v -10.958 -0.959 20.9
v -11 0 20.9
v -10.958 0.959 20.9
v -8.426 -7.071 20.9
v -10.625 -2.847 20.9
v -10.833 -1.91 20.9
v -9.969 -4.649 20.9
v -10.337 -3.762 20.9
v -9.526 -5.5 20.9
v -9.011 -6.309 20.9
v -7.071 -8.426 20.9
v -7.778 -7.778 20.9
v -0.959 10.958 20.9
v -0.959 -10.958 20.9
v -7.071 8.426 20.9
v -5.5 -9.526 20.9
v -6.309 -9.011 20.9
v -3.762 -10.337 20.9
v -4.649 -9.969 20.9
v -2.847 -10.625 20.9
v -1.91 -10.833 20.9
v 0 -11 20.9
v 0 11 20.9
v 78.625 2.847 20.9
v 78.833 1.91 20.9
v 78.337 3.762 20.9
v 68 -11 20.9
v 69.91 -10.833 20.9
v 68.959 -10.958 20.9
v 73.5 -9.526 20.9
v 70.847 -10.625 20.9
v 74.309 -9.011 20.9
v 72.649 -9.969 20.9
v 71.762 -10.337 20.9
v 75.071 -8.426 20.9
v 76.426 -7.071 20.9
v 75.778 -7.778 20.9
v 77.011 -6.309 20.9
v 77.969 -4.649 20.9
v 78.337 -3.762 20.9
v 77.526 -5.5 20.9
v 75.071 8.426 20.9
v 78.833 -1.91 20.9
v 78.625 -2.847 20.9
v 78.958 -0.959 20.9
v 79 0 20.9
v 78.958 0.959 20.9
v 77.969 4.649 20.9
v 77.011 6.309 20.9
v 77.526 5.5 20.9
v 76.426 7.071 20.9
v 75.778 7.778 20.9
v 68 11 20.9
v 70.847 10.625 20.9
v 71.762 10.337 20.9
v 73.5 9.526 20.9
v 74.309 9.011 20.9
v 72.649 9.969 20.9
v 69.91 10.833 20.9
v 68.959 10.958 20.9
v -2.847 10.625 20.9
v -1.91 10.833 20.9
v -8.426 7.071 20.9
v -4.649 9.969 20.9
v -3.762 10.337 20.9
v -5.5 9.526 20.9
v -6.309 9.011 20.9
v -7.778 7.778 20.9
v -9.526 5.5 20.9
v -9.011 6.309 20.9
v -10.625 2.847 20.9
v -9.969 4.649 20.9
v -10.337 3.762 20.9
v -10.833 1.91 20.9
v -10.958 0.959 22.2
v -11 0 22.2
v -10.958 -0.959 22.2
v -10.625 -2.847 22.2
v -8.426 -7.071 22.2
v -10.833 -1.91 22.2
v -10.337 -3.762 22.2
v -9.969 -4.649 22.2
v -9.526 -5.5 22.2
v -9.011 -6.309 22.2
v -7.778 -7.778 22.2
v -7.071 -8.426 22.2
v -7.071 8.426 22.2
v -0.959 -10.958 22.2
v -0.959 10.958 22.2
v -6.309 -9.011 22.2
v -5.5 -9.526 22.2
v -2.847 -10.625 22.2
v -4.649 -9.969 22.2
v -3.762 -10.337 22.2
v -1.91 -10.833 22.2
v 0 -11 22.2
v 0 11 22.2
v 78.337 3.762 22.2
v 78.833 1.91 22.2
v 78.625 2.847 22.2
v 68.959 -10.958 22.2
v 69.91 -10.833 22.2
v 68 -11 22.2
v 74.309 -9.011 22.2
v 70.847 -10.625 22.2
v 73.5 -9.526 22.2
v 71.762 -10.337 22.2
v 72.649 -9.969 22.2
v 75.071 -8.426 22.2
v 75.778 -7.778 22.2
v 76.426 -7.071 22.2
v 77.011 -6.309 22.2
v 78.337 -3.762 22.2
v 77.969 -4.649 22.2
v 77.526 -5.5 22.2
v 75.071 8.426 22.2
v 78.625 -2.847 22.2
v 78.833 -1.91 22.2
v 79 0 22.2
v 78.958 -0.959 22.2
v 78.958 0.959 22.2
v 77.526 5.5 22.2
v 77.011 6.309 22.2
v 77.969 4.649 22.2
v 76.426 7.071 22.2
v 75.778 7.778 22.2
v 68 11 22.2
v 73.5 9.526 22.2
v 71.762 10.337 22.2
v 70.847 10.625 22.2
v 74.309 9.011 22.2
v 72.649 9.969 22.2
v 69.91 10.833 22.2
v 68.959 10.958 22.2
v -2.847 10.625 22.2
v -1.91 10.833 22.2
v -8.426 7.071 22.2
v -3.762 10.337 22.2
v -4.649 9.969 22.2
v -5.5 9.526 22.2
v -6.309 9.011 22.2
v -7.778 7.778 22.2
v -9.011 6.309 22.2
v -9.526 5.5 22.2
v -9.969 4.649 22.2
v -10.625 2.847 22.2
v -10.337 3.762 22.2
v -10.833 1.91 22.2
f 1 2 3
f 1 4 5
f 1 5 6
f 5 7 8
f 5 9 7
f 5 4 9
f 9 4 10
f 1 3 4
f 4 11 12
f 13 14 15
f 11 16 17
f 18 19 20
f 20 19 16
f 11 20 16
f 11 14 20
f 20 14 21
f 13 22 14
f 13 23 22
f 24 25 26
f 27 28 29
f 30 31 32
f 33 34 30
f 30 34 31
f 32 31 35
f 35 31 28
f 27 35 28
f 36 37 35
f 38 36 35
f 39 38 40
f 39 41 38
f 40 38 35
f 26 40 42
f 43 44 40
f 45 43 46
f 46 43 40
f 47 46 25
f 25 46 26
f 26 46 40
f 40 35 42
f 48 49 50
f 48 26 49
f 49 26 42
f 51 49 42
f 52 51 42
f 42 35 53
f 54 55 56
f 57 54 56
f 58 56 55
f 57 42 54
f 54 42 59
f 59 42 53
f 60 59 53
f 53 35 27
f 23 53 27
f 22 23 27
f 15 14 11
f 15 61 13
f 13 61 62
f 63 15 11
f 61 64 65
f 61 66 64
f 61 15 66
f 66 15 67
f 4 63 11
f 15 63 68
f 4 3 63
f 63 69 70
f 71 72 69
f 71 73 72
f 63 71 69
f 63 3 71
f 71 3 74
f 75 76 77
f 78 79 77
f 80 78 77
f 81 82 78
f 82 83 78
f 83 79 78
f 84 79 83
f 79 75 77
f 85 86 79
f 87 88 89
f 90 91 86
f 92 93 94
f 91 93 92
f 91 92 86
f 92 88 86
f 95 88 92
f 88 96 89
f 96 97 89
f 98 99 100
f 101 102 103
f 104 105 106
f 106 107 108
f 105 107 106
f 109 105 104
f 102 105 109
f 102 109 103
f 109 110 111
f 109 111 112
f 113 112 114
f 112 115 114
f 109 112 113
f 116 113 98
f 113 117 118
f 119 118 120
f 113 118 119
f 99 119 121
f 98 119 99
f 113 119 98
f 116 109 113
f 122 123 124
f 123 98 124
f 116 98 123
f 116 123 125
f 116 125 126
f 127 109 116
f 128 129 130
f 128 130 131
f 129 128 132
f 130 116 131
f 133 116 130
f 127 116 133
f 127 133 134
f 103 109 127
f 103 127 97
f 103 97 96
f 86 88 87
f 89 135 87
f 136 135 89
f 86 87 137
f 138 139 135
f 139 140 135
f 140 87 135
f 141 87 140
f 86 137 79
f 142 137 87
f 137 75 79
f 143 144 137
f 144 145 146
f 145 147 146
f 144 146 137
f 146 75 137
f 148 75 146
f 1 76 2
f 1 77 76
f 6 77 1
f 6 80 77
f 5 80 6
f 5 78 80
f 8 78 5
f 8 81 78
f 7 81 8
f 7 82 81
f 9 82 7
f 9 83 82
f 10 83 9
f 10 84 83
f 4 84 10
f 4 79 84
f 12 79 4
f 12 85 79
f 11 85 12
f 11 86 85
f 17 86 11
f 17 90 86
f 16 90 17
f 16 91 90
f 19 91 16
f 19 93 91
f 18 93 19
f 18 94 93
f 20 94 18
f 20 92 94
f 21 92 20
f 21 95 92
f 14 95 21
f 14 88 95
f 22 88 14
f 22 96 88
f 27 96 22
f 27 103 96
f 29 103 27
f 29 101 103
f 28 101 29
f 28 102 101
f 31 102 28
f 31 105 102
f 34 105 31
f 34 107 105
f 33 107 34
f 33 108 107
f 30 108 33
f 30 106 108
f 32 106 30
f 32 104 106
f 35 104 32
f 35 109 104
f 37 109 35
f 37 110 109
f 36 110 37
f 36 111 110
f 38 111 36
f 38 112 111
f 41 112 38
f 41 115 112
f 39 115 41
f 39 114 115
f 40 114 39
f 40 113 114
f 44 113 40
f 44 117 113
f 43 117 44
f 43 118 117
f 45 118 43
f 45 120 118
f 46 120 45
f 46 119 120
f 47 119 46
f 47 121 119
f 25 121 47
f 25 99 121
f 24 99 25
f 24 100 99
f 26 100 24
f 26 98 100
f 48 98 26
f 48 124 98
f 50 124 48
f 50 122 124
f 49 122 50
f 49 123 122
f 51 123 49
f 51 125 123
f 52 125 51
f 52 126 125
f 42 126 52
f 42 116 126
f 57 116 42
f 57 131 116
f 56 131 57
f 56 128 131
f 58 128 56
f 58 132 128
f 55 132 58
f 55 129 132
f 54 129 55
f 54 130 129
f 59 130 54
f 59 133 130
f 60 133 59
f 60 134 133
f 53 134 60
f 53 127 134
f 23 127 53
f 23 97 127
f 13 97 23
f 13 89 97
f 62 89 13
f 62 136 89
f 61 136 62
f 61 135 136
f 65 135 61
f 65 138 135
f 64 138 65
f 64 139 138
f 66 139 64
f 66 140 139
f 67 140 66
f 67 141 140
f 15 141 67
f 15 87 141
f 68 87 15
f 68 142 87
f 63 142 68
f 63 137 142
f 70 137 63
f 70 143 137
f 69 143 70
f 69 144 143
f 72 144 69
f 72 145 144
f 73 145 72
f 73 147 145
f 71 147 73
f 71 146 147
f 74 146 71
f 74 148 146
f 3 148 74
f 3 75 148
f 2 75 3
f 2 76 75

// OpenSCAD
// file: ../testbox.scad
// ===== Straight 5-LED letter-stroke test box =====
// The A0 recipe (white reflector shell + integrated clear lens over an air gap) as a
// short straight stroke segment, at the bolt's pixel pitch. Purpose: try the
// INTEGRATED-lens path and see what fuzzy skin does on the lens face.
//
// PRINT AS-ORIENTED = plate on the bed, LENS UP. The lens top is the outer surface,
// so enable Fuzzy Skin on the clear part in the slicer. Pixels plug into the collars
// from the BOTTOM after printing. NO SUPPORTS: walls are vertical, and the clear lens
// is a ~18mm bridge anchored on both long walls (roof over the channel).
//
// Two-material: WHITE shell -> filament 1, CLEAR lens -> filament 2. Export both,
// combine with tools/make_3mf.py.

include <config.scad>
include <collar.scad>

tb_n      = 5;                      // number of pixels
tb_pitch  = 17;                    // bolt pixel pitch (mm)
tb_inner  = 18;                    // channel interior (= bolt); collar O16 fits
tb_wall   = 2;                     // white wall thickness
tb_outer  = tb_inner + 2*tb_wall; // 22mm outer
tb_gap    = 15;                    // LED-tip -> lens air gap (winning A0 value)
tb_wall_h = dome_clear + tb_gap;  // wall height above the plate (19mm)
tb_lens_t = 1.2;                  // clear lens thickness
tb_fuse   = 0.1;                  // white/clear overlap so the slicer fuses them

function tb_x(i) = i * tb_pitch;  // pixel x positions: 0 .. (n-1)*pitch

module tb_stroke(w) {             // straight stadium: rounded caps past the end pixels
    hull() { translate([tb_x(0),0]) circle(d=w); translate([tb_x(tb_n-1),0]) circle(d=w); }
}

module testbox_white() {          // plate + walls + collars (pixels plug in from below)
    difference() {
        union() {
            linear_extrude(plate_t) tb_stroke(tb_outer);
            translate([0,0,plate_t]) linear_extrude(tb_wall_h)
                difference() { tb_stroke(tb_outer); tb_stroke(tb_inner); }
        }
        for (i=[0:tb_n-1]) translate([tb_x(i),0,-0.1]) cylinder(h=plate_t+0.2, d=pixel_through);
    }
    for (i=[0:tb_n-1]) place_collar(tb_x(i), 0);
}

module testbox_clear() {          // integrated lens roof (bridges the channel), smooth top
    translate([0,0,plate_t+tb_wall_h-tb_fuse])
        linear_extrude(tb_lens_t+tb_fuse) tb_stroke(tb_outer);
}

// ---- baked "fuzzy skin": a random bumpy top on the lens to scatter/soften light ----
// Bambu's fuzzy skin only textures vertical walls, so we bake the noise into the top
// geometry. Heights from src/parts/fuzz.dat (regen: tools/make_fuzz.py). Print lens-UP.
fuzz_h = 0.55;   // peak bump height above the flat lens top
module testbox_clear_fuzzy() {
    z0  = plate_t + tb_wall_h - tb_fuse;                 // fused to walls
    top = plate_t + tb_wall_h + tb_lens_t;              // nominal flat top
    union() {
        translate([0,0,z0]) linear_extrude(top - z0) tb_stroke(tb_outer);   // flat lens body
        intersection() {                                                     // random bumps, clipped
            translate([tb_x(tb_n-1)/2, 0, top-0.1]) surface(file="fuzz.dat", center=true, convexity=8);
            translate([0,0,top-0.2]) linear_extrude(fuzz_h+0.6) tb_stroke(tb_outer);
        }
    }
}
// file: ../collar.scad
// Calibrated press-fit collar, merged into the rear wall at each pixel.
// The STL is symmetric top/bottom (retention lip at mid-height), so insertion
// direction does not matter. Native STL sits X-centered at collar_cx, Z 0..collar_h.

module collar_solid() {
    translate([-collar_cx, 0, 0])
        import(collar_stl, convexity = 6);
}

module place_collar(x, y) {
    translate([x, y, 0]) collar_solid();
}
// file: ../config.scad
// ===== CHARGE LED sign — global config =====
// Edit this file; then run ./build.sh to regenerate every STL.

$fn = 72;

// ---- calibrated collar (press-fit for 12mm bullet pixel) ----
collar_stl    = "../../assets/bullet-collar.stl"; // path resolved from src/parts/ entry files
collar_h      = 2.0;     // Z span of the collar STL
collar_od     = 16.0;    // collar outer diameter
collar_cx     = 43.0;    // STL native X center (Y center is 0)
pixel_through = 12.3;    // clearance hole through the plate (just over bore Ø12.19)
dome_clear    = 4.0;     // dome protrusion above plate front. Spec: 5.5mm dome-tip-to-flange,
                         // flange seats on plate back, minus 2mm plate ~= 3.5-4mm. Seat a real
                         // pixel and measure to lock it in.

// ---- shell ----
plate_t    = 2.0;        // rear plate thickness (== collar_h, so the collar sits flush)
wall_t     = 2.5;        // chimney wall thickness
cell_inner = 30;         // square interior of each test cell (the press-fit opening)

// ---- diffuser panels (flat, drop-in — kept for the final glued option) ----
panel_press_clear = 0.25; // panel is this much SMALLER than the opening (total) -> friction fit
panel_thicks      = [1, 2, 3];

// ---- diffuser CAP (slides over an ISOLATED chimney; not used on touching rows) ----
cap_fit_clear = 0.4;   // skirt-inner minus chimney-outer (total); bigger = looser slide
cap_skirt_t   = 1.6;   // skirt wall thickness
cap_skirt_h   = 7;     // how far the skirt grips down over the chimney

// ---- diffuser LID = flanged plug (plug locates in the opening, flange catches on the rim) ----
lid_flange_cover = wall_t;  // flange overhang per side ~= wall width (rests on rim, can't fall in)
lid_flange_gap   = 0.3;     // shrink the flange a hair so neighbour lids don't clash
lid_plug_h       = 4;       // how far the plug drops into the opening (0 = plain flat tile)
lid_plug_clear   = 0.5;     // plug-outer = opening minus this (total) -> snug slip fit
lid_plug_wall    = 1.5;     // plug-frame wall thickness

// ---- coupon depth ladder ----
led_gaps = [20, 35, 50]; // clear LED-tip -> panel distance, per cell (mm)

// ---- collar v2: original bore + lip, plus a 45-deg lead-in chamfer ----
bore_face_r   = 6.10;    // collar bore radius at each face (~Ø12.2)
chamfer_depth = 0.5;     // axial depth of the 45-deg lead-in at each face
mouth_r       = bore_face_r + chamfer_depth;  // chamfer mouth radius (~Ø13.2)

// ---- collar A/B test harness ----
harness_w     = 52;      // tile width
harness_d     = 30;      // tile depth
harness_t     = plate_t; // match the real wall thickness for a faithful fit test
harness_pitch = 24;      // spacing between the two hole centers

// ---- derived ----
cell_pitch = cell_inner + 2 * wall_t;      // outer cell footprint (35)
n_cells    = len(led_gaps);
plate_w    = n_cells * cell_pitch;
plate_d    = cell_pitch;
panel_side = cell_inner - panel_press_clear;
function cell_x(i)     = i * cell_pitch + cell_pitch / 2;
function chimney_H(i)  = plate_t + dome_clear + led_gaps[i];
// main file
// CLEAR integrated lens with a BAKED fuzzy (random bumpy) top. Print lens-up. filament 2.
// Needs fuzz.dat in this dir (tools/make_fuzz.py). Pair with testbox_white for the 3MF.
include <../config.scad>
include <../collar.scad>
include <../testbox.scad>
testbox_clear_fuzzy();
